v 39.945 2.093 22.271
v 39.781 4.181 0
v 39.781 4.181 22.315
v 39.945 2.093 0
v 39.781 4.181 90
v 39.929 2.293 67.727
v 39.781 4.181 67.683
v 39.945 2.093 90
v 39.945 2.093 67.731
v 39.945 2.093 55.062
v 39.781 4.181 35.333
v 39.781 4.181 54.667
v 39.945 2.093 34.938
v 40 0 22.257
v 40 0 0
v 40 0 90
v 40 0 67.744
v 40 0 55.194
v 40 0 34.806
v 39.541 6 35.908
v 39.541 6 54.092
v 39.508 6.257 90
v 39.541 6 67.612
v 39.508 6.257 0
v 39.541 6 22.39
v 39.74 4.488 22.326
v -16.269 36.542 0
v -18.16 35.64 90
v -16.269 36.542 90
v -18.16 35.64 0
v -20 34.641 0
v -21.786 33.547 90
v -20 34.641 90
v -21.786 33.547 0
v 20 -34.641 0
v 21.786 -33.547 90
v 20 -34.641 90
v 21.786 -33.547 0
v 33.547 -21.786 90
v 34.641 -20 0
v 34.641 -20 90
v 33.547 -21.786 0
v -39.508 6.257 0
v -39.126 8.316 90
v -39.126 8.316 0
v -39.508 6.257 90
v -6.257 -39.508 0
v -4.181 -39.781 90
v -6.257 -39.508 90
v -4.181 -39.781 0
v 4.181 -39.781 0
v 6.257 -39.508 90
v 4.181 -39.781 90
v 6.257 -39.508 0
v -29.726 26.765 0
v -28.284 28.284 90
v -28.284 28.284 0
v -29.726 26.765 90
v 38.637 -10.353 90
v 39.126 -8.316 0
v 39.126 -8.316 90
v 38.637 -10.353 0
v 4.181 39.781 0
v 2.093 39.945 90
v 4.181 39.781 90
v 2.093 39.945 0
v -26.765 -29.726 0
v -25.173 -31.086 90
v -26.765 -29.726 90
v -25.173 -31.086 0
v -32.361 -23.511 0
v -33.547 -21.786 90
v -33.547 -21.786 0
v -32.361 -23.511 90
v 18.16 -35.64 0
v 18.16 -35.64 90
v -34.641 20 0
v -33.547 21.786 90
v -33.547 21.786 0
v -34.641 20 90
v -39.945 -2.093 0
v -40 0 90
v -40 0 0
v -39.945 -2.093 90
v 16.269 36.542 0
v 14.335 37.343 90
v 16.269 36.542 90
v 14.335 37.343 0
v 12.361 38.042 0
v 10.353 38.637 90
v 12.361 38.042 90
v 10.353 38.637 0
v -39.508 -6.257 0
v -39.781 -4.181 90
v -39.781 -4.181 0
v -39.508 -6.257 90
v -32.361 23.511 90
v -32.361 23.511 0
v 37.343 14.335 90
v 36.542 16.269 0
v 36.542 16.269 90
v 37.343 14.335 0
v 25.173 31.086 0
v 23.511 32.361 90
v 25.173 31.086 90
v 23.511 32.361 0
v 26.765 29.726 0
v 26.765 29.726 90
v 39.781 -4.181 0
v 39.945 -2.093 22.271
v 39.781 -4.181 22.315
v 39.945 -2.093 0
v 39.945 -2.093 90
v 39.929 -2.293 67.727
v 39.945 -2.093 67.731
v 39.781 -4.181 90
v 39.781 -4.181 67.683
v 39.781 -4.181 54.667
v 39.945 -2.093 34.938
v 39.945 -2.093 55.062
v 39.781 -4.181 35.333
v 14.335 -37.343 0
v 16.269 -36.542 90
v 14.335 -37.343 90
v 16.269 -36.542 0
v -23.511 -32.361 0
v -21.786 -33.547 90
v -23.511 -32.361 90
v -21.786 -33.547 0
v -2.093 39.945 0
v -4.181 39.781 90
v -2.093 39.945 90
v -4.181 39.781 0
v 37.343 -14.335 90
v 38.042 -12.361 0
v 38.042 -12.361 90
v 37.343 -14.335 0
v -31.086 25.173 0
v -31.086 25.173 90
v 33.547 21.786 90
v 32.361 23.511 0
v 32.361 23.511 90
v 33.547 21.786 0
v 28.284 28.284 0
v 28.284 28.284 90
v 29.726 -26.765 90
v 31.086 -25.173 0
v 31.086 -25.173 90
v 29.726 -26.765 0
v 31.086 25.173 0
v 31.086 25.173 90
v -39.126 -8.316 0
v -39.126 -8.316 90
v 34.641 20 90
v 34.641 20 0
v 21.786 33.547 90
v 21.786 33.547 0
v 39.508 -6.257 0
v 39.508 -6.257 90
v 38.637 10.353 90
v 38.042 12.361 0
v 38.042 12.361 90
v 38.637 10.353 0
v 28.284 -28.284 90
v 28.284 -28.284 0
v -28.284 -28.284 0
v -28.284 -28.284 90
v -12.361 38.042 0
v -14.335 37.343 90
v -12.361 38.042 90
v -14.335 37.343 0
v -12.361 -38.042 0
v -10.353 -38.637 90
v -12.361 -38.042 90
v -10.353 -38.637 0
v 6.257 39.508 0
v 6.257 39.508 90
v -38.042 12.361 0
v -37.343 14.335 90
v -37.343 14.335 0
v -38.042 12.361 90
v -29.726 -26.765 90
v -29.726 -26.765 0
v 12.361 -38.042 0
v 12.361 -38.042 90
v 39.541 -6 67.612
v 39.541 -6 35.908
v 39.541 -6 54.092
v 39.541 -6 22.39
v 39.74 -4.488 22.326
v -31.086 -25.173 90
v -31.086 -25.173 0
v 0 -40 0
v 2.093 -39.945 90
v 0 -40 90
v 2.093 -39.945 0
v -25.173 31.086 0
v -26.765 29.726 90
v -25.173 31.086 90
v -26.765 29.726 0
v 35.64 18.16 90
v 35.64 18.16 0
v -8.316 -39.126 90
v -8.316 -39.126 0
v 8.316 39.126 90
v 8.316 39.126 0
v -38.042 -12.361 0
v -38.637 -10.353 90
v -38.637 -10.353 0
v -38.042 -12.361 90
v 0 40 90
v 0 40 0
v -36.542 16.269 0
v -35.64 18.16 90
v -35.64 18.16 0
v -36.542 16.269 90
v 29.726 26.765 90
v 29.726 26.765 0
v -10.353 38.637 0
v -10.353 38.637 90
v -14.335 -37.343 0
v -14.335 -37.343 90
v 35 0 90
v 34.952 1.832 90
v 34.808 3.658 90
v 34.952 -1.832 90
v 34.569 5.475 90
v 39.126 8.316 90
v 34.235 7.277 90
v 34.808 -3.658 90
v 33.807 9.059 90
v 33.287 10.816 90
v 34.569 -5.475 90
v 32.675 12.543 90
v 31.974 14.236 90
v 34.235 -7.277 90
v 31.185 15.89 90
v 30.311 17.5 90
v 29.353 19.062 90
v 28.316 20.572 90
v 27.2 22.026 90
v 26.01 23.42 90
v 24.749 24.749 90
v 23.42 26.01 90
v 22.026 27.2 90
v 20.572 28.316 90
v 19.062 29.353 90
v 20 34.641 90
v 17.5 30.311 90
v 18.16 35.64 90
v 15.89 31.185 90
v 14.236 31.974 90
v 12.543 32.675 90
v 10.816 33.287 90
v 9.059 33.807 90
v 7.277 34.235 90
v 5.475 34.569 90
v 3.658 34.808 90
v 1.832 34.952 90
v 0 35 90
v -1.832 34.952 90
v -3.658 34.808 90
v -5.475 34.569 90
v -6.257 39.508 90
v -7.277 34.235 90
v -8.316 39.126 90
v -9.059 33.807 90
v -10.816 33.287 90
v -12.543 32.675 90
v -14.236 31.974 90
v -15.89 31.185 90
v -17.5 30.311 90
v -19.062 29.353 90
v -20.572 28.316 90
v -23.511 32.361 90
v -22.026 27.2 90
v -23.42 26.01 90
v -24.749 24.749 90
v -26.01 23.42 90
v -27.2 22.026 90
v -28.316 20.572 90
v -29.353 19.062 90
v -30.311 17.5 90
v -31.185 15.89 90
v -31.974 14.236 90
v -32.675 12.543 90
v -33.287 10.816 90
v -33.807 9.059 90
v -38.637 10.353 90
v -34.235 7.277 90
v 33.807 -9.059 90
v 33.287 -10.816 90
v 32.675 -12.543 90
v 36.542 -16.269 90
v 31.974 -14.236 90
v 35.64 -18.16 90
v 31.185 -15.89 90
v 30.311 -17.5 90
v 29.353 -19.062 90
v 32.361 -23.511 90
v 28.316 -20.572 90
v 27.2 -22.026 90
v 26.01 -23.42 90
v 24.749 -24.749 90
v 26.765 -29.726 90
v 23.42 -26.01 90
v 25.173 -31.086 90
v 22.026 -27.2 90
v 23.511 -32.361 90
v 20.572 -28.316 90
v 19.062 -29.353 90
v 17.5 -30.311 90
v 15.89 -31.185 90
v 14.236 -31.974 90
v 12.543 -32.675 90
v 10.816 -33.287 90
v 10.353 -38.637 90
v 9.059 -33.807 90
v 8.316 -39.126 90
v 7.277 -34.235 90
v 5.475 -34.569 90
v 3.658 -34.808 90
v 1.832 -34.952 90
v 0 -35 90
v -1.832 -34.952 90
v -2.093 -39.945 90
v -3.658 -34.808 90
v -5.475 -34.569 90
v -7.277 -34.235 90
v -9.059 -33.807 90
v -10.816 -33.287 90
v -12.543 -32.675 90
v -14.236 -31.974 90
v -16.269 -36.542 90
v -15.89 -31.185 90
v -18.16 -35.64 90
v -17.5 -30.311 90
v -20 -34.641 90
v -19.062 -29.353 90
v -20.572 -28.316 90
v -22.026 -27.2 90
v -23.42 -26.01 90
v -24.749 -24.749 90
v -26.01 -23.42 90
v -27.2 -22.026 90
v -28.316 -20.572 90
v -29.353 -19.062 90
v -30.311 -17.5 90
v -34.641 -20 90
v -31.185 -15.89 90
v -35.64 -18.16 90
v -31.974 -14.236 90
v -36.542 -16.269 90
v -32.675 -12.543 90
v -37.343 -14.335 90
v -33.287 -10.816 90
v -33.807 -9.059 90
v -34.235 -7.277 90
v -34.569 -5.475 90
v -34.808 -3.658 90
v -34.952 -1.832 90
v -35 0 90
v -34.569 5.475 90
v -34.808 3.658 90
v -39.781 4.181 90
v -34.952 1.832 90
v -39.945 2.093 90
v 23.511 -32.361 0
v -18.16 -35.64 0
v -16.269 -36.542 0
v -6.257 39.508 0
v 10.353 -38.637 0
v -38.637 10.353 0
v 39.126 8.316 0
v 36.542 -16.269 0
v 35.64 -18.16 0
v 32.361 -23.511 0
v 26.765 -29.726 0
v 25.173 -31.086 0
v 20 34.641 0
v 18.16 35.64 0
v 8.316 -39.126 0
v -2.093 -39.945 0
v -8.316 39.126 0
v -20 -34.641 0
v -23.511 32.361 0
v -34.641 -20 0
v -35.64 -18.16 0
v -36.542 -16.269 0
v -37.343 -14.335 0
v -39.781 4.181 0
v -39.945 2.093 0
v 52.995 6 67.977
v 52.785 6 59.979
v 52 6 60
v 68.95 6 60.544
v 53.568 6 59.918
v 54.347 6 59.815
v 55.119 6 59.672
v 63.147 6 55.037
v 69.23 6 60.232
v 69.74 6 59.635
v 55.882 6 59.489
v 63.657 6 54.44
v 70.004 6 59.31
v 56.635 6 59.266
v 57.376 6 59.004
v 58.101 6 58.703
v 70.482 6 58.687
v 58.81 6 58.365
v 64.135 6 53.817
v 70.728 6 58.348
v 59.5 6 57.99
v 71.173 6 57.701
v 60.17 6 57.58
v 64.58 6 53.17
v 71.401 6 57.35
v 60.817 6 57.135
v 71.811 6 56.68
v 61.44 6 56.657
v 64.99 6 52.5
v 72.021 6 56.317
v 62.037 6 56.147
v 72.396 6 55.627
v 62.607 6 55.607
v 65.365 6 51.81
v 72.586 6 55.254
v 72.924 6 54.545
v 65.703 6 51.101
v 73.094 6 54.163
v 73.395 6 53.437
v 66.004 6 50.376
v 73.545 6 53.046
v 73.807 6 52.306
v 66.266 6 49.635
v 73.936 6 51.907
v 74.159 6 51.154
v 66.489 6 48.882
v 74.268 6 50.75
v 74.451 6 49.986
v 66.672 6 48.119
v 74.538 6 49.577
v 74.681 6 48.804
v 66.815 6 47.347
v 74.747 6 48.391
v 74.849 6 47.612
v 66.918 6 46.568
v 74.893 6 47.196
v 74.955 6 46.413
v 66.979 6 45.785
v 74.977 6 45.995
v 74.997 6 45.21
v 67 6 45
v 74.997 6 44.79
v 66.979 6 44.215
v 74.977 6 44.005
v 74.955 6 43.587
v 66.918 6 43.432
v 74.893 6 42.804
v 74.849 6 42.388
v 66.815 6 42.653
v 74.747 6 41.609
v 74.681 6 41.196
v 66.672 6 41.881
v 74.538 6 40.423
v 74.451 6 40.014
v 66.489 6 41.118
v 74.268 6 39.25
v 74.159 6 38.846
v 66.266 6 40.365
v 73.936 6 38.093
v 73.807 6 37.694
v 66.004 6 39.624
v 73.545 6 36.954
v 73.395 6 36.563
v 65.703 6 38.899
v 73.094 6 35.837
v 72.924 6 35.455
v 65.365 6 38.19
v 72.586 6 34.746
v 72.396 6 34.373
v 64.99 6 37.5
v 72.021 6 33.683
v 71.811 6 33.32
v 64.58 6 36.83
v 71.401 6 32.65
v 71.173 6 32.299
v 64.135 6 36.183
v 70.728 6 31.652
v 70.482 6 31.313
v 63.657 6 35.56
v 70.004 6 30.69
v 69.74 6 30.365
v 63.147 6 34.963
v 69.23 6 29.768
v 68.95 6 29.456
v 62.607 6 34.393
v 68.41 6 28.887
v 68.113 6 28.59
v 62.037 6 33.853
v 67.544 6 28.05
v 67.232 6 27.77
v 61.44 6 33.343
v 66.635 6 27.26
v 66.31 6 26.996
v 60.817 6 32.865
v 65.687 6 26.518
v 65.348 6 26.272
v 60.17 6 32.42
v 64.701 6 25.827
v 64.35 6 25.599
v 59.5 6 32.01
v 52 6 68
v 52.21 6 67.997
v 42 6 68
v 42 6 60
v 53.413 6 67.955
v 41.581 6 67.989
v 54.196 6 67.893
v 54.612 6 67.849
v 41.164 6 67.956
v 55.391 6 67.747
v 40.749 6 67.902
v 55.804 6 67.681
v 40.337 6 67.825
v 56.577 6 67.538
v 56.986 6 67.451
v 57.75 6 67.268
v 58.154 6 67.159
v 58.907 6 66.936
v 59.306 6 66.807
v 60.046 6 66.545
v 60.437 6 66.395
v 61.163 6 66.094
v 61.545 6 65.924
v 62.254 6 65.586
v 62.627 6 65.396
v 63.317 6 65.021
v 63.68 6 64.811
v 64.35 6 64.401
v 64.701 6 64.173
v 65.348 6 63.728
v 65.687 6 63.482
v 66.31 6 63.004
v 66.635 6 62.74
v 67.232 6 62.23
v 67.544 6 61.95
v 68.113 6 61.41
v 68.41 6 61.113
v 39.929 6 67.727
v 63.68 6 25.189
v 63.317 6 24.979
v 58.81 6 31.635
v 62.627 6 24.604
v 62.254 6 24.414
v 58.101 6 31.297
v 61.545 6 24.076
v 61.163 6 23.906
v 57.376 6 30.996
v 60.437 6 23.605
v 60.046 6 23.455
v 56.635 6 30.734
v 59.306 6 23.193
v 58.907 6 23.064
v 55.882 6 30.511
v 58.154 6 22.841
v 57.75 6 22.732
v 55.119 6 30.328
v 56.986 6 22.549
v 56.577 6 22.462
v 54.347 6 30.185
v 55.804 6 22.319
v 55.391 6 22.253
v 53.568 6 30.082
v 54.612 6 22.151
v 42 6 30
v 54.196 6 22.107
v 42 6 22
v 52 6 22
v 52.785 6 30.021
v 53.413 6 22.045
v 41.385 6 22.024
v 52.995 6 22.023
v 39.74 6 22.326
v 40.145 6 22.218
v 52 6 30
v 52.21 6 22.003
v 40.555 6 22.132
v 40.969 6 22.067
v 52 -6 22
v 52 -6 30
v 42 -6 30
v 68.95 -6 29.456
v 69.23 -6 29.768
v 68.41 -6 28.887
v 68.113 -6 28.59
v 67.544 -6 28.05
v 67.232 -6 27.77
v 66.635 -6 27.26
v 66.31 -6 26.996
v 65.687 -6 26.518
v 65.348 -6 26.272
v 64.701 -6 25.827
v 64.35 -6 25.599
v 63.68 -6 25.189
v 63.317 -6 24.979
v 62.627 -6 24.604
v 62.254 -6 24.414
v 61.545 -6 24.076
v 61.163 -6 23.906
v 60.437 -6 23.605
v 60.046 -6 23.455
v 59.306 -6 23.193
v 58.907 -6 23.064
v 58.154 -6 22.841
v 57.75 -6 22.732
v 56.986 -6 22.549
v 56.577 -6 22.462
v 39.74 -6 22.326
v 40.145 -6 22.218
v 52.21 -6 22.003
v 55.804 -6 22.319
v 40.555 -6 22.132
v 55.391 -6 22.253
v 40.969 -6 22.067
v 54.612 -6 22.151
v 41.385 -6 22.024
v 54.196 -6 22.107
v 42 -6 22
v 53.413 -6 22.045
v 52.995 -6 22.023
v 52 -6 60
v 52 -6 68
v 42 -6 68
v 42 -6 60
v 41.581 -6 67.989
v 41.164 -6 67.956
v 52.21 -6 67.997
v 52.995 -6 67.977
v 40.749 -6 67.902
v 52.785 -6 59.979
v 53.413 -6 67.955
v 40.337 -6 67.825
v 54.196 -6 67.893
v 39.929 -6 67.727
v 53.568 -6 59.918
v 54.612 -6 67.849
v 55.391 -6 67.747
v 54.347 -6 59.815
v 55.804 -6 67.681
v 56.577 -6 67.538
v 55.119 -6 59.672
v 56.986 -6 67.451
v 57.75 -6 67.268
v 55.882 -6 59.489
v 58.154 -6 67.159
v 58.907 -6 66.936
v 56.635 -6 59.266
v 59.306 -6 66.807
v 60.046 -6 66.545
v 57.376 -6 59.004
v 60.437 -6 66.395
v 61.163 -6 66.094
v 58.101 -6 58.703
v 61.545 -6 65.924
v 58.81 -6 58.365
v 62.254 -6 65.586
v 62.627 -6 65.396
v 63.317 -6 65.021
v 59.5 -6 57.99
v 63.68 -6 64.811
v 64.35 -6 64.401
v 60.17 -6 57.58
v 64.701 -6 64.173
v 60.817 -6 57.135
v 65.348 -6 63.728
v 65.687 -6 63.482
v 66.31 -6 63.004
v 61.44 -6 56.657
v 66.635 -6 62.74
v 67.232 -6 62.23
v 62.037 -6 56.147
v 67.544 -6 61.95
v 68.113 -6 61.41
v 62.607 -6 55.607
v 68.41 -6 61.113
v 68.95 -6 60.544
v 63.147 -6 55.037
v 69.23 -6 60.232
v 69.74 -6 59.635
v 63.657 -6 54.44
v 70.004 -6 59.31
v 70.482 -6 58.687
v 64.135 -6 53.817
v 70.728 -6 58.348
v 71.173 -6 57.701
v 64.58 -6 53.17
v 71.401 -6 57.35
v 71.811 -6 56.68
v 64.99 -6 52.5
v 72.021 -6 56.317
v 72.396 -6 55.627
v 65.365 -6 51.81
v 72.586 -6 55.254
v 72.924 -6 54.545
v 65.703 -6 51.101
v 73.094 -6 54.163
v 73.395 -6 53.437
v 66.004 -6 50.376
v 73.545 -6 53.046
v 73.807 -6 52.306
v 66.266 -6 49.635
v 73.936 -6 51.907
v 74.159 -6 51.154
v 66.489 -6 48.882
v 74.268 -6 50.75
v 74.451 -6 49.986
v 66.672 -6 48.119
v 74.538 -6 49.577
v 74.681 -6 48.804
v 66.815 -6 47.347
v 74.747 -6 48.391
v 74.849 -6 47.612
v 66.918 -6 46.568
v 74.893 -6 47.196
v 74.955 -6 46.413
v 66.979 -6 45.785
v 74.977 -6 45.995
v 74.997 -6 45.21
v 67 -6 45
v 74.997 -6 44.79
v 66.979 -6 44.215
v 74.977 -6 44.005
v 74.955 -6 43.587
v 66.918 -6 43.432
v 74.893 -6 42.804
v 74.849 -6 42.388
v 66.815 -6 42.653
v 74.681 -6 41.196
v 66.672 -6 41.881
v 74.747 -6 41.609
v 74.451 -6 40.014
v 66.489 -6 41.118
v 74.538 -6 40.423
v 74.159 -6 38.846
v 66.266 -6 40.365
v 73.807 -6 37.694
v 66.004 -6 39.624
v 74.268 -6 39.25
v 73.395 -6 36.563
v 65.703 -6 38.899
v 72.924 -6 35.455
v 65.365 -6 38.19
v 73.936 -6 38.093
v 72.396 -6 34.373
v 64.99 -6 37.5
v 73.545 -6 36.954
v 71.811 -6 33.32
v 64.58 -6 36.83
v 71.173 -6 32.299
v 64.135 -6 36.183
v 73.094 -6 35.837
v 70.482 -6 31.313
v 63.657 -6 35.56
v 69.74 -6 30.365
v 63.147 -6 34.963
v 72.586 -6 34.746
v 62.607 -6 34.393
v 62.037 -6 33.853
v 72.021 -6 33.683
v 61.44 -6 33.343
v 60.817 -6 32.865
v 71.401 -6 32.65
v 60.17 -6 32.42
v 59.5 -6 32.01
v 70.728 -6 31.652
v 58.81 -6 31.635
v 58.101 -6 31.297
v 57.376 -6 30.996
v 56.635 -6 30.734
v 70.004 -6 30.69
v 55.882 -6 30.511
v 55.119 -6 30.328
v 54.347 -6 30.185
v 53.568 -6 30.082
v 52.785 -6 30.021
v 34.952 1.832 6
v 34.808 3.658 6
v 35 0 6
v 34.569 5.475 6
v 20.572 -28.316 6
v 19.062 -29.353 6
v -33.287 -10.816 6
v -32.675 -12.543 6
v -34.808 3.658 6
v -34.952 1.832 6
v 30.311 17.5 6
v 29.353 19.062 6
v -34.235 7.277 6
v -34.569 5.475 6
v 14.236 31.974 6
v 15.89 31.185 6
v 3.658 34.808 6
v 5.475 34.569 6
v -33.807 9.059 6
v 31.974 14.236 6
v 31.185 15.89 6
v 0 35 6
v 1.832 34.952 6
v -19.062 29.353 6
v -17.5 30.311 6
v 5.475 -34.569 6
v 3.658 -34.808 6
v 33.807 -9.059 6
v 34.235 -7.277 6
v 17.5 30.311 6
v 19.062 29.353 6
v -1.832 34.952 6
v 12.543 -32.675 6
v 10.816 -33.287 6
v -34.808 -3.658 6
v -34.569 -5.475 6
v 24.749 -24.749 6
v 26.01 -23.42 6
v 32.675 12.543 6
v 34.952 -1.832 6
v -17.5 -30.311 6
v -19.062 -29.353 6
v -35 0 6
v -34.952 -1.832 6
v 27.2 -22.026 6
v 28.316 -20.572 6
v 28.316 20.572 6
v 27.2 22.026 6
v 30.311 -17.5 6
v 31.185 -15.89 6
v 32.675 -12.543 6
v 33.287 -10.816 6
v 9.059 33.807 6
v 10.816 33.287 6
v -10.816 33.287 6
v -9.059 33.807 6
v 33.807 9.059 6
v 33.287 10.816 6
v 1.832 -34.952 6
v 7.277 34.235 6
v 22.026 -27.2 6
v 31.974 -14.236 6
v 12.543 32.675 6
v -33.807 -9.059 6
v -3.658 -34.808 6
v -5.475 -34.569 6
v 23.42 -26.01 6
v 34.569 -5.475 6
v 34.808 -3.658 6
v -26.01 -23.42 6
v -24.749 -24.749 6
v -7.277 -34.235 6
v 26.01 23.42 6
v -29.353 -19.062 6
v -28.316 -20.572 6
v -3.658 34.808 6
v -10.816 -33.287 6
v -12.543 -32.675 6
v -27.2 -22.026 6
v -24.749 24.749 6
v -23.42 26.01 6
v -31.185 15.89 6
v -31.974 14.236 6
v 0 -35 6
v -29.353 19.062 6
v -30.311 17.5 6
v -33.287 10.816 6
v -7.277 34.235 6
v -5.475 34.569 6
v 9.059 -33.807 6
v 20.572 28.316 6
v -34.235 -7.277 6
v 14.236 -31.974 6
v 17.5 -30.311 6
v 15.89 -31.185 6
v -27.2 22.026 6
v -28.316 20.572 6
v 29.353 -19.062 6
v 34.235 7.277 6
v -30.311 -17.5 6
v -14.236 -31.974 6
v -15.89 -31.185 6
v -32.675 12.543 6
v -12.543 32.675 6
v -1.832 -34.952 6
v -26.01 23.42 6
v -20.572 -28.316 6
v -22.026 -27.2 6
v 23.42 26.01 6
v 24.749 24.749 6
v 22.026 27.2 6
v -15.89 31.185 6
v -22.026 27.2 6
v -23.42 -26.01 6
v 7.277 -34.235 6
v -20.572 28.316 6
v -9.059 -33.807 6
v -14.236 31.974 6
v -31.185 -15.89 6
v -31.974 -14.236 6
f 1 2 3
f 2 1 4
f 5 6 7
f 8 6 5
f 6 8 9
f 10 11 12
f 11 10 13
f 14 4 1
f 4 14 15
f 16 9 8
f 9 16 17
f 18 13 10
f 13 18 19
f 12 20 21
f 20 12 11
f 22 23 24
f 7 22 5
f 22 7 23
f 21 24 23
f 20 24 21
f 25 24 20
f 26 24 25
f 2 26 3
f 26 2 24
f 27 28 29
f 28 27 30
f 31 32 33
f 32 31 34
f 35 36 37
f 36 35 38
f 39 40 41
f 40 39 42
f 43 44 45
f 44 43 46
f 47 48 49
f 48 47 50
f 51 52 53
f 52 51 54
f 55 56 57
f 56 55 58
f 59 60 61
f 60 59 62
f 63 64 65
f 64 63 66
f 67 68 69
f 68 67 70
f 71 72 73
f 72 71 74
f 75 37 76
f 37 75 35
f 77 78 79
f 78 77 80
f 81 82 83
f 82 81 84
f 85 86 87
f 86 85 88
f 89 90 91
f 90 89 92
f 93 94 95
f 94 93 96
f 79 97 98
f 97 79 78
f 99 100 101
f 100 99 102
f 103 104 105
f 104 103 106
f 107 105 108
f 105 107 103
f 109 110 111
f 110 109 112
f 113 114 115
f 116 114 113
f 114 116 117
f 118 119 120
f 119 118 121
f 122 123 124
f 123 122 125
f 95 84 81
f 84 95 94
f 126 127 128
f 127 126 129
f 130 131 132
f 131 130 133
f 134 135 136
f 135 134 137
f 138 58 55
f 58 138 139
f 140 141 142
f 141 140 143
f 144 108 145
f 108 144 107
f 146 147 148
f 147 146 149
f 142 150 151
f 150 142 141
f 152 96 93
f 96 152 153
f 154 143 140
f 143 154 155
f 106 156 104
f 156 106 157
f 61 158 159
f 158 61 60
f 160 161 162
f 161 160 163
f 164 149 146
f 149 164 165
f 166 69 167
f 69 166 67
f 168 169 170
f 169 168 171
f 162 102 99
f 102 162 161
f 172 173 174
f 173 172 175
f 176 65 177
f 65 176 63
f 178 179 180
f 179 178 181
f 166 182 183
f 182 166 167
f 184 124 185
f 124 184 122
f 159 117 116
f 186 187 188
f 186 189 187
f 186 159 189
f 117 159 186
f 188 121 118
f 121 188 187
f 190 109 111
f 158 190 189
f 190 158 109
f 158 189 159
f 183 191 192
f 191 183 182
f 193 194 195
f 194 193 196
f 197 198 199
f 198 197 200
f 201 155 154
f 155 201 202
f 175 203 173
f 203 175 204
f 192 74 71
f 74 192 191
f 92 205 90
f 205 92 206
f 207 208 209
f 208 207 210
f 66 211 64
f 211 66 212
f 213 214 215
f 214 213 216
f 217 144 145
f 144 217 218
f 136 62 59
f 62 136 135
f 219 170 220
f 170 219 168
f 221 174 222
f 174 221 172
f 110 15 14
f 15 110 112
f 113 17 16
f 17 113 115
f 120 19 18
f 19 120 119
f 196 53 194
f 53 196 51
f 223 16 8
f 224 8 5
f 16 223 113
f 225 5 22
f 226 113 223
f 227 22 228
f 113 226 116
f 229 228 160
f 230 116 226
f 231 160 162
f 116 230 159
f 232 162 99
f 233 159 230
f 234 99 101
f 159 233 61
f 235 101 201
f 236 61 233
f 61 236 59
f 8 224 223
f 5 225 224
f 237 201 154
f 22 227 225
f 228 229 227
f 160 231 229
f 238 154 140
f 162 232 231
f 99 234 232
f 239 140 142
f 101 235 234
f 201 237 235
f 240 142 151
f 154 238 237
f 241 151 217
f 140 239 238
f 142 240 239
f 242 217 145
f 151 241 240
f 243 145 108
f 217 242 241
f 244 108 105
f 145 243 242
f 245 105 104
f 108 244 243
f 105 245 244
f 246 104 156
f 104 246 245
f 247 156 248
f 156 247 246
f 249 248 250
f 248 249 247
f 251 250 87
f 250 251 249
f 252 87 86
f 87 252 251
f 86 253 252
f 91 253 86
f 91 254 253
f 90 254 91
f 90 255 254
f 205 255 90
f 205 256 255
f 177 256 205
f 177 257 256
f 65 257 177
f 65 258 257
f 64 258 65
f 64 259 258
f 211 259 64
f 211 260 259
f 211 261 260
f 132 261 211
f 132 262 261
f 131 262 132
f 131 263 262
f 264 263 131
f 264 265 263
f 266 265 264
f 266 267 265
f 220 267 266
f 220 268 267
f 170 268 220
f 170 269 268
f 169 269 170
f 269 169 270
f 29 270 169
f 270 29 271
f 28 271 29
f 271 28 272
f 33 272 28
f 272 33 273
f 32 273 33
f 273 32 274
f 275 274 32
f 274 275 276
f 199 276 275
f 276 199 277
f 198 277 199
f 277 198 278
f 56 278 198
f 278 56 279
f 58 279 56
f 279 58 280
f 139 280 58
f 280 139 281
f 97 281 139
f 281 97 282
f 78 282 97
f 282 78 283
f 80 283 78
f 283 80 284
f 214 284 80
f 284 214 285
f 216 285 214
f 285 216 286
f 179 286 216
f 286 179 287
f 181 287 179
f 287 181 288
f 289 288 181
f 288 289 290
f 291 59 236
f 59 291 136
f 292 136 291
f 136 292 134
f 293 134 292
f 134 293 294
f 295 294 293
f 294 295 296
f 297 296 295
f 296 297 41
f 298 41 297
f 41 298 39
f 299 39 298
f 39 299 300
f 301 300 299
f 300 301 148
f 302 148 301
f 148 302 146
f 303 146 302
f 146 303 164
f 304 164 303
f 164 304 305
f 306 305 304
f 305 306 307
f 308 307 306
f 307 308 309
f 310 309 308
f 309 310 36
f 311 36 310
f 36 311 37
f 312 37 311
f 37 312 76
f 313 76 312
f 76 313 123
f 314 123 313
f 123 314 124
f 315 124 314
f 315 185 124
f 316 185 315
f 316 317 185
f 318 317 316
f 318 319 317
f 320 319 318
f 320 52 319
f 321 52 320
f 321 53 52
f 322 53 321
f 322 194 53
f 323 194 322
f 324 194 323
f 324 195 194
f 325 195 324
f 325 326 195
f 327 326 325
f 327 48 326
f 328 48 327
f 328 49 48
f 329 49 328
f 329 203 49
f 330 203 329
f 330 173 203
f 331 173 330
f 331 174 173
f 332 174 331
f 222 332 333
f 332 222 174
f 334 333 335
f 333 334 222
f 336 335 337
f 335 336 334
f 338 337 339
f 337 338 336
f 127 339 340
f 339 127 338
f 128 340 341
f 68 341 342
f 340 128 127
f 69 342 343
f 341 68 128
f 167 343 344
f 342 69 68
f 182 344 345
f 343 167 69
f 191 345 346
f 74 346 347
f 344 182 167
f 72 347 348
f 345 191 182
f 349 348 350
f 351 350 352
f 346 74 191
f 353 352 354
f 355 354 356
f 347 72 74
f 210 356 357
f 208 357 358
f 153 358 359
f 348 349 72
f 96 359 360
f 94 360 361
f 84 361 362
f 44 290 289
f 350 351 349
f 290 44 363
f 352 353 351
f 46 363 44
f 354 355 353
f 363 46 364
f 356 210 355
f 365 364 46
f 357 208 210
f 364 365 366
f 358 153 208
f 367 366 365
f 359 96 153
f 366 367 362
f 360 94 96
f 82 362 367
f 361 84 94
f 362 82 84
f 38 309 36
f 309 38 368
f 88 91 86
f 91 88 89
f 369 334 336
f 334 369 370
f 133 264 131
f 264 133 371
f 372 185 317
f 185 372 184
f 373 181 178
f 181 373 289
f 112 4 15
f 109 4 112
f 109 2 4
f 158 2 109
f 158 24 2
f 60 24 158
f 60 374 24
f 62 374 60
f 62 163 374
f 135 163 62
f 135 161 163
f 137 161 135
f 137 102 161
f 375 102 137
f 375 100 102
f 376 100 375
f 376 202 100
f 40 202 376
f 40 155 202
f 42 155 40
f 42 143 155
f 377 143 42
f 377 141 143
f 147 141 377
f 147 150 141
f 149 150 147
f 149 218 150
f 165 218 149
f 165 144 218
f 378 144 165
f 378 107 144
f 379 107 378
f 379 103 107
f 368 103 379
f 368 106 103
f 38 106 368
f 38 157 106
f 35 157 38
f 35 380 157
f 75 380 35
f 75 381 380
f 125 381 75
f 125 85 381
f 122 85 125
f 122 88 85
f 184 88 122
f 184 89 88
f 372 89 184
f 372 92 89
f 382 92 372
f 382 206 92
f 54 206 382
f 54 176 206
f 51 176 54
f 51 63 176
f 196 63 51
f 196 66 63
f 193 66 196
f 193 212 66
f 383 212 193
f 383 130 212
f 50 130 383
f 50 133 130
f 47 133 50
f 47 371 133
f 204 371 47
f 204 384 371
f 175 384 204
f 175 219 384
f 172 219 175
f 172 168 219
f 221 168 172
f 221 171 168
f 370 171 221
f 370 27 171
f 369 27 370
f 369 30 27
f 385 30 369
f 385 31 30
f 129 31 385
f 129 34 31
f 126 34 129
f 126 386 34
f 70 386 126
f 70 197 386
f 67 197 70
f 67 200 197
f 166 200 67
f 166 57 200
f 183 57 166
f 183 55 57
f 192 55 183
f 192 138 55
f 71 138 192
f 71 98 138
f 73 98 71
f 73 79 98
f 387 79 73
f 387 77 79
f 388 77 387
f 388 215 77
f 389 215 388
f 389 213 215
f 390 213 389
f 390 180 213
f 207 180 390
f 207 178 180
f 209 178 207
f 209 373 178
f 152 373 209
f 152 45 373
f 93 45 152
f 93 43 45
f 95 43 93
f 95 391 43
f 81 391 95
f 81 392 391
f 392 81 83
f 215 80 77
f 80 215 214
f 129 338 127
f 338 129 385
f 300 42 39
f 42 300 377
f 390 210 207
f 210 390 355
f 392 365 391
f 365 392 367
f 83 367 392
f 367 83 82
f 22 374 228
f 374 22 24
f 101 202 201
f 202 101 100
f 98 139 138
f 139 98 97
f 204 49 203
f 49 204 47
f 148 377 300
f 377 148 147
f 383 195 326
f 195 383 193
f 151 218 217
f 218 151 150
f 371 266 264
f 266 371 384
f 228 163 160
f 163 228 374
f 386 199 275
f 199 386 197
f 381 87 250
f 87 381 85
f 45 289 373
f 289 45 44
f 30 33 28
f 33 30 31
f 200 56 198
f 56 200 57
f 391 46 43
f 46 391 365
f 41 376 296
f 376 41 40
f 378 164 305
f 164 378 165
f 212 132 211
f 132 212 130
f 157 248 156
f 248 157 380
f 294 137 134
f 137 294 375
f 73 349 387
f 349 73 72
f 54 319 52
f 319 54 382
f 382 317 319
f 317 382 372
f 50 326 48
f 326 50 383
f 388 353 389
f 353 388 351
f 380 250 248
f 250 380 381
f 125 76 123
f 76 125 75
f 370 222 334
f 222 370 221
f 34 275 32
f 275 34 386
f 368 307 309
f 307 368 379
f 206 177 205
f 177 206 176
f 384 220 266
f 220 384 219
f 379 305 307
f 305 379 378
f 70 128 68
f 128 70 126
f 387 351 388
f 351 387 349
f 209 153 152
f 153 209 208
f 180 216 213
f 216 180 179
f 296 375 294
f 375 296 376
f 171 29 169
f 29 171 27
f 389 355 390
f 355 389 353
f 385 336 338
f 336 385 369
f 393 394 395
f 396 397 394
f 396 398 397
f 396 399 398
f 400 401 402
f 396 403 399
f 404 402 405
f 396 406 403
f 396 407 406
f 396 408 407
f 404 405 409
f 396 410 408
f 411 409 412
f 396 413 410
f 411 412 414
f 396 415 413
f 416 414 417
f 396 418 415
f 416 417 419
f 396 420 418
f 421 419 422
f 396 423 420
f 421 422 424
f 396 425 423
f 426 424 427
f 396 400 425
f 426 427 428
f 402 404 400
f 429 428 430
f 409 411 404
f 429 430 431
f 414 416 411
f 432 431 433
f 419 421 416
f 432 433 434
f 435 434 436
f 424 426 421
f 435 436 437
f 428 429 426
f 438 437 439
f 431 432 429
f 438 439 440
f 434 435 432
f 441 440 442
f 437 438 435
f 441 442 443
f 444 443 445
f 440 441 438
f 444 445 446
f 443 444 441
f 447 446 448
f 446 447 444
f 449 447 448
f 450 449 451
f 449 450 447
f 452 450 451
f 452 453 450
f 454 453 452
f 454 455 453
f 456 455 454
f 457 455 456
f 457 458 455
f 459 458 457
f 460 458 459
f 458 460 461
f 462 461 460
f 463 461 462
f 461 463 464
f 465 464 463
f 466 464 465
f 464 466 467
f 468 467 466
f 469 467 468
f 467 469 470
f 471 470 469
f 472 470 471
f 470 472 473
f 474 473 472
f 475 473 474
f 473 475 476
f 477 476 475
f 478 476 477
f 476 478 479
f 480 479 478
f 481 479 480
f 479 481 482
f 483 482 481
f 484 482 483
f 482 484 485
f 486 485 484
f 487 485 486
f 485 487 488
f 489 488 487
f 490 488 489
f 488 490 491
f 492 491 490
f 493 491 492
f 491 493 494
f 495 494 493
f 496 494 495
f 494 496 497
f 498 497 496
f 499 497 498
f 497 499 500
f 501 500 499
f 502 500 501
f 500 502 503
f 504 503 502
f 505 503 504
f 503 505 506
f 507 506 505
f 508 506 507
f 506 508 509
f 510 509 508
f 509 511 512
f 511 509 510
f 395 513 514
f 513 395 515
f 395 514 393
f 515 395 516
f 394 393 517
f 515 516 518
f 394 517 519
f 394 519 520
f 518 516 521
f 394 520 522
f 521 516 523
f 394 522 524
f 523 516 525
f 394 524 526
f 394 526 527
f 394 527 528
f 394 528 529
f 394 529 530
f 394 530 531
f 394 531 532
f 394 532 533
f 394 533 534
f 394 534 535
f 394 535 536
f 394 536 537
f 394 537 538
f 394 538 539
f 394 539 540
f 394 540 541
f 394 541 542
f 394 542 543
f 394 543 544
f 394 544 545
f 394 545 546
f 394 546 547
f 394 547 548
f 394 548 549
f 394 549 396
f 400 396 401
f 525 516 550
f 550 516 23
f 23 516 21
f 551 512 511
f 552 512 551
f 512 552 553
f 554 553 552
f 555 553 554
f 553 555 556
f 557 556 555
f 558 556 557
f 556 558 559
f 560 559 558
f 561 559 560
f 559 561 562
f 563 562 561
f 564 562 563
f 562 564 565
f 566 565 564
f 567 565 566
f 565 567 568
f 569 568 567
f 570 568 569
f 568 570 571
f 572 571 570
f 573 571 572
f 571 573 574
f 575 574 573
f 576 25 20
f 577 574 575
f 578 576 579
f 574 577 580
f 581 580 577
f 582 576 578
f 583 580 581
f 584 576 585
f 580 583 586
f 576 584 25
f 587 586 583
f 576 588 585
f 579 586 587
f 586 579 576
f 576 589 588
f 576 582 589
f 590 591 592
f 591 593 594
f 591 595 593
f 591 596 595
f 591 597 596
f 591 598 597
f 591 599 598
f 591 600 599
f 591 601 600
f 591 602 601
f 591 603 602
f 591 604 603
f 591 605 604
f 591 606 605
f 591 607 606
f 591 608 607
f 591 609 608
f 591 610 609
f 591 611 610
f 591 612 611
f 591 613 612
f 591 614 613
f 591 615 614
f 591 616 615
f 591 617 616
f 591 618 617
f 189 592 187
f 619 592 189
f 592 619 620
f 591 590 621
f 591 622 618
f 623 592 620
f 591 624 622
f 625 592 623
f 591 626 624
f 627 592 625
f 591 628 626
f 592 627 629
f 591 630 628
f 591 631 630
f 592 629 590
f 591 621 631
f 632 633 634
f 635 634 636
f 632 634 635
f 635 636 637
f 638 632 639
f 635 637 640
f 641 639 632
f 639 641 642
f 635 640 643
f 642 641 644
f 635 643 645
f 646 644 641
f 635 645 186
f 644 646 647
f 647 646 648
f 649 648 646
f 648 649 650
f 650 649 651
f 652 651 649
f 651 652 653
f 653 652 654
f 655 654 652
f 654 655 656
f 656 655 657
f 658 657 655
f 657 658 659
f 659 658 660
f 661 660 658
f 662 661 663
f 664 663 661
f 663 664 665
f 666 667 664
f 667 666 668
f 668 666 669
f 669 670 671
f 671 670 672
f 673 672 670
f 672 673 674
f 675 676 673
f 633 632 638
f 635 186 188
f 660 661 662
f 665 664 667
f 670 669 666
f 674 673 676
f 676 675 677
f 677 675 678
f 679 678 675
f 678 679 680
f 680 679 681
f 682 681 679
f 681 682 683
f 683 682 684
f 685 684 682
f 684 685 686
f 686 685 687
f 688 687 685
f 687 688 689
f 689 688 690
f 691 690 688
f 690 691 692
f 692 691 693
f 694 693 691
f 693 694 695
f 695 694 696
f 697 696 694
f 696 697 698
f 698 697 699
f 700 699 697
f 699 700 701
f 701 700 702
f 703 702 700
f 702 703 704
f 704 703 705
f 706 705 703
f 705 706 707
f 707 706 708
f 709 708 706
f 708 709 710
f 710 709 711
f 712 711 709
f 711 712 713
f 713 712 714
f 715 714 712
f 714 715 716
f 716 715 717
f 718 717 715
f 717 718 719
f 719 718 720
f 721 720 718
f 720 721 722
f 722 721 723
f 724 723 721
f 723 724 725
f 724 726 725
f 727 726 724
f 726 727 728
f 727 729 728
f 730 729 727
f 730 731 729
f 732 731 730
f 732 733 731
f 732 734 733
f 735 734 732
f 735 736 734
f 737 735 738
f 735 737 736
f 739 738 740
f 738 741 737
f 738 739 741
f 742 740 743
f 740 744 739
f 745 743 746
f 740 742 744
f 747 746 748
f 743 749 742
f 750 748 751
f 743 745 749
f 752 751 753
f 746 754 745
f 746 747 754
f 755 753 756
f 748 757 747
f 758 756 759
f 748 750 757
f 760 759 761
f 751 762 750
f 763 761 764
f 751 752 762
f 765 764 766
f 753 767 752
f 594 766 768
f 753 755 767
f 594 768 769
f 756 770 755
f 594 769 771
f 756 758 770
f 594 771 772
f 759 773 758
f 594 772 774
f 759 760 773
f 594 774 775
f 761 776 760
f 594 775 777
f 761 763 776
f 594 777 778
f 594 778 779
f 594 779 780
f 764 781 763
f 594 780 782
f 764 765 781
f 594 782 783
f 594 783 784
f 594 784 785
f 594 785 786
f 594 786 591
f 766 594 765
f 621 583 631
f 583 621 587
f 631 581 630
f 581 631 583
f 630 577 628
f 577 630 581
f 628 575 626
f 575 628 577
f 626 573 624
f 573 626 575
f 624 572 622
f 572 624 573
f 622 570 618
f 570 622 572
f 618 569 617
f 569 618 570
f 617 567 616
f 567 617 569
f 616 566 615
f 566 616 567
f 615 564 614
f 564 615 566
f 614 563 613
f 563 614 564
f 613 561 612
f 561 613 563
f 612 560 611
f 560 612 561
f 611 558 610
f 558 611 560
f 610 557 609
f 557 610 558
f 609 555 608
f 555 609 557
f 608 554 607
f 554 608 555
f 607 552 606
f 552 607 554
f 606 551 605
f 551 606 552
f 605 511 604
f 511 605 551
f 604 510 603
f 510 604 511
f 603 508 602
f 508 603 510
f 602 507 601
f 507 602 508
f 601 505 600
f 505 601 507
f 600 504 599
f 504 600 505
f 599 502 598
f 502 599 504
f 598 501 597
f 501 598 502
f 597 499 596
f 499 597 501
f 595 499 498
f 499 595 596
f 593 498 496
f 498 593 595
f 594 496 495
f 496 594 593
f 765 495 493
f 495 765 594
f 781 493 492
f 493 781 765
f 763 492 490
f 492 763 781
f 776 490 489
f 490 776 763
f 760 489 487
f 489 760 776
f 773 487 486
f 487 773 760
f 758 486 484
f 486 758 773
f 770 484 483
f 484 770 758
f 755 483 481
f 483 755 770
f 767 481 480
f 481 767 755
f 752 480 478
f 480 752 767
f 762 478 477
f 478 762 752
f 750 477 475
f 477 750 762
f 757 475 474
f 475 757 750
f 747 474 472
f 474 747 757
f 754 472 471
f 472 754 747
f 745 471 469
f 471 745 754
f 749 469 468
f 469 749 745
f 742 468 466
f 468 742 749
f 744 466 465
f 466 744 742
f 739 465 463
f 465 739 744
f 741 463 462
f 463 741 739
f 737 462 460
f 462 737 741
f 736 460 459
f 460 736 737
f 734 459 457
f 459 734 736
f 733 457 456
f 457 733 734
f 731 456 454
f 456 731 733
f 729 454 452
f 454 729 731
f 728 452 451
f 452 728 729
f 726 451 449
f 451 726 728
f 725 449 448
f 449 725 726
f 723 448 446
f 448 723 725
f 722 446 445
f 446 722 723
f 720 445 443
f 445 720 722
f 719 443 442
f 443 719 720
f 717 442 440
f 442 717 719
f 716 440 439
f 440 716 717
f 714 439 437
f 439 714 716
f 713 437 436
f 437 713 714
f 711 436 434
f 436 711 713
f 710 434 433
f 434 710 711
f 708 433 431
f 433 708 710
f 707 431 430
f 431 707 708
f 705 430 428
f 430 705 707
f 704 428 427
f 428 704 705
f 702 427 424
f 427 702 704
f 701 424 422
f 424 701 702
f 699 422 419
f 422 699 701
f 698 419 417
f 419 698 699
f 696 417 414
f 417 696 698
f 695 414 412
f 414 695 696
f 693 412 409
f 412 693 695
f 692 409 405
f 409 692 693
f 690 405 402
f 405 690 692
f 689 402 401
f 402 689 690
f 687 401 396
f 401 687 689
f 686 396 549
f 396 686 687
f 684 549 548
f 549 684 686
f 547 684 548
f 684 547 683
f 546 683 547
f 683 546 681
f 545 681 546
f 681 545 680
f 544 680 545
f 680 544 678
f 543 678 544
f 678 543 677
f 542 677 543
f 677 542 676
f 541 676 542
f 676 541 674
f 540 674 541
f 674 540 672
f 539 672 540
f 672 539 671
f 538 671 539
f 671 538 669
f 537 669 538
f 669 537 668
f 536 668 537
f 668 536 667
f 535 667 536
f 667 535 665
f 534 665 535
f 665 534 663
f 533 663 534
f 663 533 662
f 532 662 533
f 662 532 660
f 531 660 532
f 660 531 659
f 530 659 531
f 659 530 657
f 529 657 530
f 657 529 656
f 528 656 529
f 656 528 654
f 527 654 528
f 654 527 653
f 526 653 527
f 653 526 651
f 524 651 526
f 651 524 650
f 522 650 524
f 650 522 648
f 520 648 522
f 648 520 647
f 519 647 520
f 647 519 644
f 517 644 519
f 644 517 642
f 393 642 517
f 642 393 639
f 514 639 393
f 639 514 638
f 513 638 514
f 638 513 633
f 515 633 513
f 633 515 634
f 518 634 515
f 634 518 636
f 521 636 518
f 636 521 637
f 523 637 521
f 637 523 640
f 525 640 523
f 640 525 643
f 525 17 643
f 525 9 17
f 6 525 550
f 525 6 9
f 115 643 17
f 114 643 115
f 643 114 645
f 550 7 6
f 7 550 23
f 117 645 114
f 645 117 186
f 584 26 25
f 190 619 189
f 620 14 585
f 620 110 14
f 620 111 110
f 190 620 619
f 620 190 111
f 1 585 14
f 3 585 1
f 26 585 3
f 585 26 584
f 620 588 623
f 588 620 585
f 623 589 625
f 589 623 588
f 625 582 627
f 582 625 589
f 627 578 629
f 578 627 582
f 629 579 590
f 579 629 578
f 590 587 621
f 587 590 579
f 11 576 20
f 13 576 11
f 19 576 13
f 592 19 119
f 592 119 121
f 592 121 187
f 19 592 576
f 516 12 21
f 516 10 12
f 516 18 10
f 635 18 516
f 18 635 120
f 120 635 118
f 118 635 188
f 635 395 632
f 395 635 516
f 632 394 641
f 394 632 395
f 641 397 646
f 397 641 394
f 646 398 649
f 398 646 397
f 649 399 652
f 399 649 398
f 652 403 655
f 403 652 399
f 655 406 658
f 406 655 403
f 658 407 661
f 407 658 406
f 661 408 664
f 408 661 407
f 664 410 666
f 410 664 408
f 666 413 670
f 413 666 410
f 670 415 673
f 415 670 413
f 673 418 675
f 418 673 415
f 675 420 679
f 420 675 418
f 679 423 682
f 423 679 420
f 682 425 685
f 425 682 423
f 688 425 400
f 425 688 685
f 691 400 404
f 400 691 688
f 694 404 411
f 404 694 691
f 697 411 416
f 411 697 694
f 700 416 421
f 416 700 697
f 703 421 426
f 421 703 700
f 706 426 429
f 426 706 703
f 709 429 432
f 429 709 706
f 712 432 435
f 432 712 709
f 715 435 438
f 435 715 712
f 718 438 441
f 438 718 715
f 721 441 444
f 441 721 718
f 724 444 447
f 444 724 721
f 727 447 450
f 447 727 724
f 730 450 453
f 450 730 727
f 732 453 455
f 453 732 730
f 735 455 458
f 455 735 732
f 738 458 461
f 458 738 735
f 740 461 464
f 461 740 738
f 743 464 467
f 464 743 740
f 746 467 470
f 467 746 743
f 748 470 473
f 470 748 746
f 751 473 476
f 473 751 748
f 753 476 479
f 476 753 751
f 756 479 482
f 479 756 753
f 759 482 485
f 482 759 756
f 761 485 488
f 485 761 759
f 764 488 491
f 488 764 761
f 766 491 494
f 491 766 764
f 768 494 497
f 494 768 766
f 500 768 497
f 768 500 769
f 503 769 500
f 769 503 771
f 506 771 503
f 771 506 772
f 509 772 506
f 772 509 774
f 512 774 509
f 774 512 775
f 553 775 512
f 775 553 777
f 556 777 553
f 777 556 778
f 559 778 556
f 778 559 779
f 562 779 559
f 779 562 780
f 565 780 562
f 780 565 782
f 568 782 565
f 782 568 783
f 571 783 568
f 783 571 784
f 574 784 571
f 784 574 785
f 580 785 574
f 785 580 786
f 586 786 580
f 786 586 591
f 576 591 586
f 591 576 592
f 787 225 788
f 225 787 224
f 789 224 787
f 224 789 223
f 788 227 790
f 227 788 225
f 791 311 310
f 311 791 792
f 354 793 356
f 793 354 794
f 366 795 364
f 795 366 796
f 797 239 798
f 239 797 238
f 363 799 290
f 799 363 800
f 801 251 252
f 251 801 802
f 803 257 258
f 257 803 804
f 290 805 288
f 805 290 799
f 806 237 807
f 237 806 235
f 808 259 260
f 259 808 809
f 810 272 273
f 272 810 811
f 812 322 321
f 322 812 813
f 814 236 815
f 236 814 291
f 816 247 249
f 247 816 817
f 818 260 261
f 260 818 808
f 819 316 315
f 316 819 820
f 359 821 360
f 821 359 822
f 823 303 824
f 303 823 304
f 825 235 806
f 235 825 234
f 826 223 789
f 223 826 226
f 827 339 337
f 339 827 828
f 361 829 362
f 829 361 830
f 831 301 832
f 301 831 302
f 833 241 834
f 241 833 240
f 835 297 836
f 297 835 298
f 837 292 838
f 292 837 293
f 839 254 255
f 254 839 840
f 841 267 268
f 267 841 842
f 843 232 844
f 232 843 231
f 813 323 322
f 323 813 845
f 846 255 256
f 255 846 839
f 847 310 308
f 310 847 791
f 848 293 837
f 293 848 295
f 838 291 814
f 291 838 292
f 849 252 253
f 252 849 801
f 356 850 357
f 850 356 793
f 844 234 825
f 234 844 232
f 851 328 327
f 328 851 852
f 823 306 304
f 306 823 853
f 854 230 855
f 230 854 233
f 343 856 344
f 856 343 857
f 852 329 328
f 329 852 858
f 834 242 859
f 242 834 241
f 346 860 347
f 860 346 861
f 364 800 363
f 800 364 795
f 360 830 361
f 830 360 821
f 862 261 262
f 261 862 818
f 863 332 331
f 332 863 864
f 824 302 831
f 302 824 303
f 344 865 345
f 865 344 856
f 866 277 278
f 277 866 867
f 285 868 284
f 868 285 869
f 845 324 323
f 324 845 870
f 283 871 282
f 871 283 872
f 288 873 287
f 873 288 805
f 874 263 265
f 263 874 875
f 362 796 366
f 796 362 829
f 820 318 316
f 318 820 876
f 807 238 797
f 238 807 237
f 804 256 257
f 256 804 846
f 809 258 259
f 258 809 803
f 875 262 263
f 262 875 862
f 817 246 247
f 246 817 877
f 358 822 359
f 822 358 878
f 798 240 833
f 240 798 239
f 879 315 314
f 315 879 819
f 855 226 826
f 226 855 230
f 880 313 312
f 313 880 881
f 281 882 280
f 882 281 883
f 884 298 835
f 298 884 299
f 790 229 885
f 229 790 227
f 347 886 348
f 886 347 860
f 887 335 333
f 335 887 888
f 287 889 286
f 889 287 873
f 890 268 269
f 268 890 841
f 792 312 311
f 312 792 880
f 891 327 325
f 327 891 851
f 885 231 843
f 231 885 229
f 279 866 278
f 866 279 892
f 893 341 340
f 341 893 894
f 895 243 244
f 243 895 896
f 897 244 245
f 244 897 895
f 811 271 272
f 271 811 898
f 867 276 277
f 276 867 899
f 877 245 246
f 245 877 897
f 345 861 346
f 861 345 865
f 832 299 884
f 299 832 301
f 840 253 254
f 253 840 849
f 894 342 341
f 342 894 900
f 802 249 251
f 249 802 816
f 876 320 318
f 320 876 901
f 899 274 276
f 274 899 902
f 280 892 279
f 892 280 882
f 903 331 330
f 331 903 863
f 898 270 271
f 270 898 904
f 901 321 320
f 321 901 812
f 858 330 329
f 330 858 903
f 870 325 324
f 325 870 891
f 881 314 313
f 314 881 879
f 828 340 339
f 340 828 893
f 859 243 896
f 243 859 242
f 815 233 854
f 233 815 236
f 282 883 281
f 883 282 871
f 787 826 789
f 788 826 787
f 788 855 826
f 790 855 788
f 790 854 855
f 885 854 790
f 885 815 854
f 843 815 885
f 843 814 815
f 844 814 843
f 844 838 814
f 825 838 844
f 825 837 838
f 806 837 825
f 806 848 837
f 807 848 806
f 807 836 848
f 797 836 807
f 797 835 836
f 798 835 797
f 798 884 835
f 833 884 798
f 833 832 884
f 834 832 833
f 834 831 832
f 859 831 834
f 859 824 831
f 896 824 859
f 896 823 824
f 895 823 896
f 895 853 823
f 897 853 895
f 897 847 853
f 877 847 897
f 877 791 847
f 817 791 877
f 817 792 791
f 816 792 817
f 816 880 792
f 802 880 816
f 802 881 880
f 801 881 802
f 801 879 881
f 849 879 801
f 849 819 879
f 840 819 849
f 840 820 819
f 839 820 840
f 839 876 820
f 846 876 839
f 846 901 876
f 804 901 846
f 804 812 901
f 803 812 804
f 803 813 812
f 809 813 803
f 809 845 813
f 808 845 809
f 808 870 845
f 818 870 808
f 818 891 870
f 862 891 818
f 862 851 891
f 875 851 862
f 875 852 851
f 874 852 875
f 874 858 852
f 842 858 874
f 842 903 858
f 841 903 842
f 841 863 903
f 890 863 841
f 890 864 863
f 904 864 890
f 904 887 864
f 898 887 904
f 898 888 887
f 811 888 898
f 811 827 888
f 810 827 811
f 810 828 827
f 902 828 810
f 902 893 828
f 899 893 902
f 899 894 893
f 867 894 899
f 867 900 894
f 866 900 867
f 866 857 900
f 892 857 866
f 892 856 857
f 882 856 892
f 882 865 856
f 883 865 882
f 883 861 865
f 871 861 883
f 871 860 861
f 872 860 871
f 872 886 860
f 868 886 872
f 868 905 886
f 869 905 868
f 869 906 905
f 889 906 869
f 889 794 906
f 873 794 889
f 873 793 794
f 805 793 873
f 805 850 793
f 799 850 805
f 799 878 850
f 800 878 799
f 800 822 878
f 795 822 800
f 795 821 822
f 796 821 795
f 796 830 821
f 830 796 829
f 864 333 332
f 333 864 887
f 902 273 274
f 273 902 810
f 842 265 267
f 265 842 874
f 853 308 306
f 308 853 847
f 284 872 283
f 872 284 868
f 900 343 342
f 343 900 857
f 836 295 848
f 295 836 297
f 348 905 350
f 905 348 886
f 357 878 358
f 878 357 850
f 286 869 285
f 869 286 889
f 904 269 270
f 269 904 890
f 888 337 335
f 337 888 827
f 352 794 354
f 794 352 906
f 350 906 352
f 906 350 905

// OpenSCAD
// 取手付きマグカップ(取手は +X 方向のみ)
$fn = 120;

// ===== パラメータ =====
outer_r   = 40;    // 外半径(外径 80mm)
inner_r   = 35;    // 内半径(内径 70mm、肉厚 5mm)
mug_h     = 90;    // 高さ
bottom_t  = 6;     // 底面の厚み

handle_t  = 8;     // 取手の棒の太さ
handle_d  = 12;    // 取手の奥行き(Y方向の幅)
open_w    = 25;    // 取手内側空間の幅(X方向、指3本分)
open_h    = 30;    // 取手内側空間の高さ(Z方向)
open_x0   = 42;    // 内側開口の開始X位置(外壁のすぐ外)
handle_z  = mug_h / 2;  // 取手の中心高さ(マグ中央)

// ===== 取手の内側開口(D字の内側): 平らな辺 + 半円 =====
module handle_opening_2d() {
    hull() {
        // 本体側の直線部分
        translate([open_x0, -open_h/2])
            square([0.01, open_h]);
        // 外側の半円部分
        translate([open_x0 + open_w - open_h/2, 0])
            circle(r = open_h/2);
    }
}

// ===== D字リング断面(内側開口を太さ handle_t で囲む) =====
module handle_2d() {
    difference() {
        offset(r = handle_t) handle_opening_2d();
        handle_opening_2d();
    }
}

// ===== 取手本体(XZ平面のD字をY方向に押し出し、+X側面へ配置) =====
// 内側の縁は本体外壁より内側まで食い込ませており、
// 後段で飲み物用キャビティを差し引くことで内壁面はきれいに保たれる
module handle() {
    translate([0, 0, handle_z])
        rotate([90, 0, 0])
            linear_extrude(height = handle_d, center = true)
                handle_2d();
}

// ===== マグ全体 =====
module mug() {
    difference() {
        // 本体外形と取手を先に union → マニフォールドを保証
        union() {
            cylinder(r = outer_r, h = mug_h);
            handle();
        }
        // 飲み物用の中空(底厚 6mm を残す)
        // 取手の食い込み部分も同時にトリムされ、内壁は滑らか
        translate([0, 0, bottom_t])
            cylinder(r = inner_r, h = mug_h);
    }
}

mug();
